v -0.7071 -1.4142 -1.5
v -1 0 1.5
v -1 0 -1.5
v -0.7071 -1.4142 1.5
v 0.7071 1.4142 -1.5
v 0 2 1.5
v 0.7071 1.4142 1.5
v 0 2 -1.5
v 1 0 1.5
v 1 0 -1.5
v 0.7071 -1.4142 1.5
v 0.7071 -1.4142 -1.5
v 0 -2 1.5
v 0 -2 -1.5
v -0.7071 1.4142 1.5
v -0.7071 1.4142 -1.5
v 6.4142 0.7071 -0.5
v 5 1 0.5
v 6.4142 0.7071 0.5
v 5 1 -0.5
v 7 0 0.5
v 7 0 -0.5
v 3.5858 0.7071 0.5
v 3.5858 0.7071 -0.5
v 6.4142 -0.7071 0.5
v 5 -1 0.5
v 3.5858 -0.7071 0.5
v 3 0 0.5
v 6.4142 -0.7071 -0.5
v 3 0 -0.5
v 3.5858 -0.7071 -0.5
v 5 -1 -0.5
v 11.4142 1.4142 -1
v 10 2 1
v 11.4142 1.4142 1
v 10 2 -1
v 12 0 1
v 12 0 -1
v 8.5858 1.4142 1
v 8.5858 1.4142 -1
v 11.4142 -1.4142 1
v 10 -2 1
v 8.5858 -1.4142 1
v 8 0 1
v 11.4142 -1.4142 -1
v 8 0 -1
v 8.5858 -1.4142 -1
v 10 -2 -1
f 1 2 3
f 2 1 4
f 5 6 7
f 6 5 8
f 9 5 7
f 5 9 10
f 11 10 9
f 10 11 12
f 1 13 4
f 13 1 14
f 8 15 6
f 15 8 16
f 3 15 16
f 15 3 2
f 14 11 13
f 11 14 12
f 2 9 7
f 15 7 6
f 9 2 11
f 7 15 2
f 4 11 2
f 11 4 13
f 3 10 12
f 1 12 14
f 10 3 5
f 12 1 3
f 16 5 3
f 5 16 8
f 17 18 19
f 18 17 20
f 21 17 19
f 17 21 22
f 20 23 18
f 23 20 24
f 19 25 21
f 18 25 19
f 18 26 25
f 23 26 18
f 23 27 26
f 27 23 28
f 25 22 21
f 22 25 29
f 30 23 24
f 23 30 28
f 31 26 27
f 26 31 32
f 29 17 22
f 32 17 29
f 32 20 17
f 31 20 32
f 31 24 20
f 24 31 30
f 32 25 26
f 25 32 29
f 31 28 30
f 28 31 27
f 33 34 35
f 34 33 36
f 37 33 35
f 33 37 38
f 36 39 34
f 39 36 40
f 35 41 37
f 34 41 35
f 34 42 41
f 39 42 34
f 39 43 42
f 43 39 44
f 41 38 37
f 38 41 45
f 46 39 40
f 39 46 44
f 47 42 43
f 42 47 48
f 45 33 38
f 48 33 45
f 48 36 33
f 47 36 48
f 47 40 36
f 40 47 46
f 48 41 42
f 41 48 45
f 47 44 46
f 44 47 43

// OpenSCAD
module obj3D() cylinder(r=1, center=true, $fn=8);

// 3 variants of 3D scale of 3D object
translate([0,0,0]) scale([1,2,3]) obj3D();
translate([5,0,0]) scale([2,1]) obj3D();
translate([10,0,0]) scale(2) obj3D();

// Scale by zero; 3D object
linear_extrude() scale([0,0,0]) obj3D();
linear_extrude() scale([0,1,0]) obj3D();
linear_extrude() scale([1,1,0]) obj3D();
